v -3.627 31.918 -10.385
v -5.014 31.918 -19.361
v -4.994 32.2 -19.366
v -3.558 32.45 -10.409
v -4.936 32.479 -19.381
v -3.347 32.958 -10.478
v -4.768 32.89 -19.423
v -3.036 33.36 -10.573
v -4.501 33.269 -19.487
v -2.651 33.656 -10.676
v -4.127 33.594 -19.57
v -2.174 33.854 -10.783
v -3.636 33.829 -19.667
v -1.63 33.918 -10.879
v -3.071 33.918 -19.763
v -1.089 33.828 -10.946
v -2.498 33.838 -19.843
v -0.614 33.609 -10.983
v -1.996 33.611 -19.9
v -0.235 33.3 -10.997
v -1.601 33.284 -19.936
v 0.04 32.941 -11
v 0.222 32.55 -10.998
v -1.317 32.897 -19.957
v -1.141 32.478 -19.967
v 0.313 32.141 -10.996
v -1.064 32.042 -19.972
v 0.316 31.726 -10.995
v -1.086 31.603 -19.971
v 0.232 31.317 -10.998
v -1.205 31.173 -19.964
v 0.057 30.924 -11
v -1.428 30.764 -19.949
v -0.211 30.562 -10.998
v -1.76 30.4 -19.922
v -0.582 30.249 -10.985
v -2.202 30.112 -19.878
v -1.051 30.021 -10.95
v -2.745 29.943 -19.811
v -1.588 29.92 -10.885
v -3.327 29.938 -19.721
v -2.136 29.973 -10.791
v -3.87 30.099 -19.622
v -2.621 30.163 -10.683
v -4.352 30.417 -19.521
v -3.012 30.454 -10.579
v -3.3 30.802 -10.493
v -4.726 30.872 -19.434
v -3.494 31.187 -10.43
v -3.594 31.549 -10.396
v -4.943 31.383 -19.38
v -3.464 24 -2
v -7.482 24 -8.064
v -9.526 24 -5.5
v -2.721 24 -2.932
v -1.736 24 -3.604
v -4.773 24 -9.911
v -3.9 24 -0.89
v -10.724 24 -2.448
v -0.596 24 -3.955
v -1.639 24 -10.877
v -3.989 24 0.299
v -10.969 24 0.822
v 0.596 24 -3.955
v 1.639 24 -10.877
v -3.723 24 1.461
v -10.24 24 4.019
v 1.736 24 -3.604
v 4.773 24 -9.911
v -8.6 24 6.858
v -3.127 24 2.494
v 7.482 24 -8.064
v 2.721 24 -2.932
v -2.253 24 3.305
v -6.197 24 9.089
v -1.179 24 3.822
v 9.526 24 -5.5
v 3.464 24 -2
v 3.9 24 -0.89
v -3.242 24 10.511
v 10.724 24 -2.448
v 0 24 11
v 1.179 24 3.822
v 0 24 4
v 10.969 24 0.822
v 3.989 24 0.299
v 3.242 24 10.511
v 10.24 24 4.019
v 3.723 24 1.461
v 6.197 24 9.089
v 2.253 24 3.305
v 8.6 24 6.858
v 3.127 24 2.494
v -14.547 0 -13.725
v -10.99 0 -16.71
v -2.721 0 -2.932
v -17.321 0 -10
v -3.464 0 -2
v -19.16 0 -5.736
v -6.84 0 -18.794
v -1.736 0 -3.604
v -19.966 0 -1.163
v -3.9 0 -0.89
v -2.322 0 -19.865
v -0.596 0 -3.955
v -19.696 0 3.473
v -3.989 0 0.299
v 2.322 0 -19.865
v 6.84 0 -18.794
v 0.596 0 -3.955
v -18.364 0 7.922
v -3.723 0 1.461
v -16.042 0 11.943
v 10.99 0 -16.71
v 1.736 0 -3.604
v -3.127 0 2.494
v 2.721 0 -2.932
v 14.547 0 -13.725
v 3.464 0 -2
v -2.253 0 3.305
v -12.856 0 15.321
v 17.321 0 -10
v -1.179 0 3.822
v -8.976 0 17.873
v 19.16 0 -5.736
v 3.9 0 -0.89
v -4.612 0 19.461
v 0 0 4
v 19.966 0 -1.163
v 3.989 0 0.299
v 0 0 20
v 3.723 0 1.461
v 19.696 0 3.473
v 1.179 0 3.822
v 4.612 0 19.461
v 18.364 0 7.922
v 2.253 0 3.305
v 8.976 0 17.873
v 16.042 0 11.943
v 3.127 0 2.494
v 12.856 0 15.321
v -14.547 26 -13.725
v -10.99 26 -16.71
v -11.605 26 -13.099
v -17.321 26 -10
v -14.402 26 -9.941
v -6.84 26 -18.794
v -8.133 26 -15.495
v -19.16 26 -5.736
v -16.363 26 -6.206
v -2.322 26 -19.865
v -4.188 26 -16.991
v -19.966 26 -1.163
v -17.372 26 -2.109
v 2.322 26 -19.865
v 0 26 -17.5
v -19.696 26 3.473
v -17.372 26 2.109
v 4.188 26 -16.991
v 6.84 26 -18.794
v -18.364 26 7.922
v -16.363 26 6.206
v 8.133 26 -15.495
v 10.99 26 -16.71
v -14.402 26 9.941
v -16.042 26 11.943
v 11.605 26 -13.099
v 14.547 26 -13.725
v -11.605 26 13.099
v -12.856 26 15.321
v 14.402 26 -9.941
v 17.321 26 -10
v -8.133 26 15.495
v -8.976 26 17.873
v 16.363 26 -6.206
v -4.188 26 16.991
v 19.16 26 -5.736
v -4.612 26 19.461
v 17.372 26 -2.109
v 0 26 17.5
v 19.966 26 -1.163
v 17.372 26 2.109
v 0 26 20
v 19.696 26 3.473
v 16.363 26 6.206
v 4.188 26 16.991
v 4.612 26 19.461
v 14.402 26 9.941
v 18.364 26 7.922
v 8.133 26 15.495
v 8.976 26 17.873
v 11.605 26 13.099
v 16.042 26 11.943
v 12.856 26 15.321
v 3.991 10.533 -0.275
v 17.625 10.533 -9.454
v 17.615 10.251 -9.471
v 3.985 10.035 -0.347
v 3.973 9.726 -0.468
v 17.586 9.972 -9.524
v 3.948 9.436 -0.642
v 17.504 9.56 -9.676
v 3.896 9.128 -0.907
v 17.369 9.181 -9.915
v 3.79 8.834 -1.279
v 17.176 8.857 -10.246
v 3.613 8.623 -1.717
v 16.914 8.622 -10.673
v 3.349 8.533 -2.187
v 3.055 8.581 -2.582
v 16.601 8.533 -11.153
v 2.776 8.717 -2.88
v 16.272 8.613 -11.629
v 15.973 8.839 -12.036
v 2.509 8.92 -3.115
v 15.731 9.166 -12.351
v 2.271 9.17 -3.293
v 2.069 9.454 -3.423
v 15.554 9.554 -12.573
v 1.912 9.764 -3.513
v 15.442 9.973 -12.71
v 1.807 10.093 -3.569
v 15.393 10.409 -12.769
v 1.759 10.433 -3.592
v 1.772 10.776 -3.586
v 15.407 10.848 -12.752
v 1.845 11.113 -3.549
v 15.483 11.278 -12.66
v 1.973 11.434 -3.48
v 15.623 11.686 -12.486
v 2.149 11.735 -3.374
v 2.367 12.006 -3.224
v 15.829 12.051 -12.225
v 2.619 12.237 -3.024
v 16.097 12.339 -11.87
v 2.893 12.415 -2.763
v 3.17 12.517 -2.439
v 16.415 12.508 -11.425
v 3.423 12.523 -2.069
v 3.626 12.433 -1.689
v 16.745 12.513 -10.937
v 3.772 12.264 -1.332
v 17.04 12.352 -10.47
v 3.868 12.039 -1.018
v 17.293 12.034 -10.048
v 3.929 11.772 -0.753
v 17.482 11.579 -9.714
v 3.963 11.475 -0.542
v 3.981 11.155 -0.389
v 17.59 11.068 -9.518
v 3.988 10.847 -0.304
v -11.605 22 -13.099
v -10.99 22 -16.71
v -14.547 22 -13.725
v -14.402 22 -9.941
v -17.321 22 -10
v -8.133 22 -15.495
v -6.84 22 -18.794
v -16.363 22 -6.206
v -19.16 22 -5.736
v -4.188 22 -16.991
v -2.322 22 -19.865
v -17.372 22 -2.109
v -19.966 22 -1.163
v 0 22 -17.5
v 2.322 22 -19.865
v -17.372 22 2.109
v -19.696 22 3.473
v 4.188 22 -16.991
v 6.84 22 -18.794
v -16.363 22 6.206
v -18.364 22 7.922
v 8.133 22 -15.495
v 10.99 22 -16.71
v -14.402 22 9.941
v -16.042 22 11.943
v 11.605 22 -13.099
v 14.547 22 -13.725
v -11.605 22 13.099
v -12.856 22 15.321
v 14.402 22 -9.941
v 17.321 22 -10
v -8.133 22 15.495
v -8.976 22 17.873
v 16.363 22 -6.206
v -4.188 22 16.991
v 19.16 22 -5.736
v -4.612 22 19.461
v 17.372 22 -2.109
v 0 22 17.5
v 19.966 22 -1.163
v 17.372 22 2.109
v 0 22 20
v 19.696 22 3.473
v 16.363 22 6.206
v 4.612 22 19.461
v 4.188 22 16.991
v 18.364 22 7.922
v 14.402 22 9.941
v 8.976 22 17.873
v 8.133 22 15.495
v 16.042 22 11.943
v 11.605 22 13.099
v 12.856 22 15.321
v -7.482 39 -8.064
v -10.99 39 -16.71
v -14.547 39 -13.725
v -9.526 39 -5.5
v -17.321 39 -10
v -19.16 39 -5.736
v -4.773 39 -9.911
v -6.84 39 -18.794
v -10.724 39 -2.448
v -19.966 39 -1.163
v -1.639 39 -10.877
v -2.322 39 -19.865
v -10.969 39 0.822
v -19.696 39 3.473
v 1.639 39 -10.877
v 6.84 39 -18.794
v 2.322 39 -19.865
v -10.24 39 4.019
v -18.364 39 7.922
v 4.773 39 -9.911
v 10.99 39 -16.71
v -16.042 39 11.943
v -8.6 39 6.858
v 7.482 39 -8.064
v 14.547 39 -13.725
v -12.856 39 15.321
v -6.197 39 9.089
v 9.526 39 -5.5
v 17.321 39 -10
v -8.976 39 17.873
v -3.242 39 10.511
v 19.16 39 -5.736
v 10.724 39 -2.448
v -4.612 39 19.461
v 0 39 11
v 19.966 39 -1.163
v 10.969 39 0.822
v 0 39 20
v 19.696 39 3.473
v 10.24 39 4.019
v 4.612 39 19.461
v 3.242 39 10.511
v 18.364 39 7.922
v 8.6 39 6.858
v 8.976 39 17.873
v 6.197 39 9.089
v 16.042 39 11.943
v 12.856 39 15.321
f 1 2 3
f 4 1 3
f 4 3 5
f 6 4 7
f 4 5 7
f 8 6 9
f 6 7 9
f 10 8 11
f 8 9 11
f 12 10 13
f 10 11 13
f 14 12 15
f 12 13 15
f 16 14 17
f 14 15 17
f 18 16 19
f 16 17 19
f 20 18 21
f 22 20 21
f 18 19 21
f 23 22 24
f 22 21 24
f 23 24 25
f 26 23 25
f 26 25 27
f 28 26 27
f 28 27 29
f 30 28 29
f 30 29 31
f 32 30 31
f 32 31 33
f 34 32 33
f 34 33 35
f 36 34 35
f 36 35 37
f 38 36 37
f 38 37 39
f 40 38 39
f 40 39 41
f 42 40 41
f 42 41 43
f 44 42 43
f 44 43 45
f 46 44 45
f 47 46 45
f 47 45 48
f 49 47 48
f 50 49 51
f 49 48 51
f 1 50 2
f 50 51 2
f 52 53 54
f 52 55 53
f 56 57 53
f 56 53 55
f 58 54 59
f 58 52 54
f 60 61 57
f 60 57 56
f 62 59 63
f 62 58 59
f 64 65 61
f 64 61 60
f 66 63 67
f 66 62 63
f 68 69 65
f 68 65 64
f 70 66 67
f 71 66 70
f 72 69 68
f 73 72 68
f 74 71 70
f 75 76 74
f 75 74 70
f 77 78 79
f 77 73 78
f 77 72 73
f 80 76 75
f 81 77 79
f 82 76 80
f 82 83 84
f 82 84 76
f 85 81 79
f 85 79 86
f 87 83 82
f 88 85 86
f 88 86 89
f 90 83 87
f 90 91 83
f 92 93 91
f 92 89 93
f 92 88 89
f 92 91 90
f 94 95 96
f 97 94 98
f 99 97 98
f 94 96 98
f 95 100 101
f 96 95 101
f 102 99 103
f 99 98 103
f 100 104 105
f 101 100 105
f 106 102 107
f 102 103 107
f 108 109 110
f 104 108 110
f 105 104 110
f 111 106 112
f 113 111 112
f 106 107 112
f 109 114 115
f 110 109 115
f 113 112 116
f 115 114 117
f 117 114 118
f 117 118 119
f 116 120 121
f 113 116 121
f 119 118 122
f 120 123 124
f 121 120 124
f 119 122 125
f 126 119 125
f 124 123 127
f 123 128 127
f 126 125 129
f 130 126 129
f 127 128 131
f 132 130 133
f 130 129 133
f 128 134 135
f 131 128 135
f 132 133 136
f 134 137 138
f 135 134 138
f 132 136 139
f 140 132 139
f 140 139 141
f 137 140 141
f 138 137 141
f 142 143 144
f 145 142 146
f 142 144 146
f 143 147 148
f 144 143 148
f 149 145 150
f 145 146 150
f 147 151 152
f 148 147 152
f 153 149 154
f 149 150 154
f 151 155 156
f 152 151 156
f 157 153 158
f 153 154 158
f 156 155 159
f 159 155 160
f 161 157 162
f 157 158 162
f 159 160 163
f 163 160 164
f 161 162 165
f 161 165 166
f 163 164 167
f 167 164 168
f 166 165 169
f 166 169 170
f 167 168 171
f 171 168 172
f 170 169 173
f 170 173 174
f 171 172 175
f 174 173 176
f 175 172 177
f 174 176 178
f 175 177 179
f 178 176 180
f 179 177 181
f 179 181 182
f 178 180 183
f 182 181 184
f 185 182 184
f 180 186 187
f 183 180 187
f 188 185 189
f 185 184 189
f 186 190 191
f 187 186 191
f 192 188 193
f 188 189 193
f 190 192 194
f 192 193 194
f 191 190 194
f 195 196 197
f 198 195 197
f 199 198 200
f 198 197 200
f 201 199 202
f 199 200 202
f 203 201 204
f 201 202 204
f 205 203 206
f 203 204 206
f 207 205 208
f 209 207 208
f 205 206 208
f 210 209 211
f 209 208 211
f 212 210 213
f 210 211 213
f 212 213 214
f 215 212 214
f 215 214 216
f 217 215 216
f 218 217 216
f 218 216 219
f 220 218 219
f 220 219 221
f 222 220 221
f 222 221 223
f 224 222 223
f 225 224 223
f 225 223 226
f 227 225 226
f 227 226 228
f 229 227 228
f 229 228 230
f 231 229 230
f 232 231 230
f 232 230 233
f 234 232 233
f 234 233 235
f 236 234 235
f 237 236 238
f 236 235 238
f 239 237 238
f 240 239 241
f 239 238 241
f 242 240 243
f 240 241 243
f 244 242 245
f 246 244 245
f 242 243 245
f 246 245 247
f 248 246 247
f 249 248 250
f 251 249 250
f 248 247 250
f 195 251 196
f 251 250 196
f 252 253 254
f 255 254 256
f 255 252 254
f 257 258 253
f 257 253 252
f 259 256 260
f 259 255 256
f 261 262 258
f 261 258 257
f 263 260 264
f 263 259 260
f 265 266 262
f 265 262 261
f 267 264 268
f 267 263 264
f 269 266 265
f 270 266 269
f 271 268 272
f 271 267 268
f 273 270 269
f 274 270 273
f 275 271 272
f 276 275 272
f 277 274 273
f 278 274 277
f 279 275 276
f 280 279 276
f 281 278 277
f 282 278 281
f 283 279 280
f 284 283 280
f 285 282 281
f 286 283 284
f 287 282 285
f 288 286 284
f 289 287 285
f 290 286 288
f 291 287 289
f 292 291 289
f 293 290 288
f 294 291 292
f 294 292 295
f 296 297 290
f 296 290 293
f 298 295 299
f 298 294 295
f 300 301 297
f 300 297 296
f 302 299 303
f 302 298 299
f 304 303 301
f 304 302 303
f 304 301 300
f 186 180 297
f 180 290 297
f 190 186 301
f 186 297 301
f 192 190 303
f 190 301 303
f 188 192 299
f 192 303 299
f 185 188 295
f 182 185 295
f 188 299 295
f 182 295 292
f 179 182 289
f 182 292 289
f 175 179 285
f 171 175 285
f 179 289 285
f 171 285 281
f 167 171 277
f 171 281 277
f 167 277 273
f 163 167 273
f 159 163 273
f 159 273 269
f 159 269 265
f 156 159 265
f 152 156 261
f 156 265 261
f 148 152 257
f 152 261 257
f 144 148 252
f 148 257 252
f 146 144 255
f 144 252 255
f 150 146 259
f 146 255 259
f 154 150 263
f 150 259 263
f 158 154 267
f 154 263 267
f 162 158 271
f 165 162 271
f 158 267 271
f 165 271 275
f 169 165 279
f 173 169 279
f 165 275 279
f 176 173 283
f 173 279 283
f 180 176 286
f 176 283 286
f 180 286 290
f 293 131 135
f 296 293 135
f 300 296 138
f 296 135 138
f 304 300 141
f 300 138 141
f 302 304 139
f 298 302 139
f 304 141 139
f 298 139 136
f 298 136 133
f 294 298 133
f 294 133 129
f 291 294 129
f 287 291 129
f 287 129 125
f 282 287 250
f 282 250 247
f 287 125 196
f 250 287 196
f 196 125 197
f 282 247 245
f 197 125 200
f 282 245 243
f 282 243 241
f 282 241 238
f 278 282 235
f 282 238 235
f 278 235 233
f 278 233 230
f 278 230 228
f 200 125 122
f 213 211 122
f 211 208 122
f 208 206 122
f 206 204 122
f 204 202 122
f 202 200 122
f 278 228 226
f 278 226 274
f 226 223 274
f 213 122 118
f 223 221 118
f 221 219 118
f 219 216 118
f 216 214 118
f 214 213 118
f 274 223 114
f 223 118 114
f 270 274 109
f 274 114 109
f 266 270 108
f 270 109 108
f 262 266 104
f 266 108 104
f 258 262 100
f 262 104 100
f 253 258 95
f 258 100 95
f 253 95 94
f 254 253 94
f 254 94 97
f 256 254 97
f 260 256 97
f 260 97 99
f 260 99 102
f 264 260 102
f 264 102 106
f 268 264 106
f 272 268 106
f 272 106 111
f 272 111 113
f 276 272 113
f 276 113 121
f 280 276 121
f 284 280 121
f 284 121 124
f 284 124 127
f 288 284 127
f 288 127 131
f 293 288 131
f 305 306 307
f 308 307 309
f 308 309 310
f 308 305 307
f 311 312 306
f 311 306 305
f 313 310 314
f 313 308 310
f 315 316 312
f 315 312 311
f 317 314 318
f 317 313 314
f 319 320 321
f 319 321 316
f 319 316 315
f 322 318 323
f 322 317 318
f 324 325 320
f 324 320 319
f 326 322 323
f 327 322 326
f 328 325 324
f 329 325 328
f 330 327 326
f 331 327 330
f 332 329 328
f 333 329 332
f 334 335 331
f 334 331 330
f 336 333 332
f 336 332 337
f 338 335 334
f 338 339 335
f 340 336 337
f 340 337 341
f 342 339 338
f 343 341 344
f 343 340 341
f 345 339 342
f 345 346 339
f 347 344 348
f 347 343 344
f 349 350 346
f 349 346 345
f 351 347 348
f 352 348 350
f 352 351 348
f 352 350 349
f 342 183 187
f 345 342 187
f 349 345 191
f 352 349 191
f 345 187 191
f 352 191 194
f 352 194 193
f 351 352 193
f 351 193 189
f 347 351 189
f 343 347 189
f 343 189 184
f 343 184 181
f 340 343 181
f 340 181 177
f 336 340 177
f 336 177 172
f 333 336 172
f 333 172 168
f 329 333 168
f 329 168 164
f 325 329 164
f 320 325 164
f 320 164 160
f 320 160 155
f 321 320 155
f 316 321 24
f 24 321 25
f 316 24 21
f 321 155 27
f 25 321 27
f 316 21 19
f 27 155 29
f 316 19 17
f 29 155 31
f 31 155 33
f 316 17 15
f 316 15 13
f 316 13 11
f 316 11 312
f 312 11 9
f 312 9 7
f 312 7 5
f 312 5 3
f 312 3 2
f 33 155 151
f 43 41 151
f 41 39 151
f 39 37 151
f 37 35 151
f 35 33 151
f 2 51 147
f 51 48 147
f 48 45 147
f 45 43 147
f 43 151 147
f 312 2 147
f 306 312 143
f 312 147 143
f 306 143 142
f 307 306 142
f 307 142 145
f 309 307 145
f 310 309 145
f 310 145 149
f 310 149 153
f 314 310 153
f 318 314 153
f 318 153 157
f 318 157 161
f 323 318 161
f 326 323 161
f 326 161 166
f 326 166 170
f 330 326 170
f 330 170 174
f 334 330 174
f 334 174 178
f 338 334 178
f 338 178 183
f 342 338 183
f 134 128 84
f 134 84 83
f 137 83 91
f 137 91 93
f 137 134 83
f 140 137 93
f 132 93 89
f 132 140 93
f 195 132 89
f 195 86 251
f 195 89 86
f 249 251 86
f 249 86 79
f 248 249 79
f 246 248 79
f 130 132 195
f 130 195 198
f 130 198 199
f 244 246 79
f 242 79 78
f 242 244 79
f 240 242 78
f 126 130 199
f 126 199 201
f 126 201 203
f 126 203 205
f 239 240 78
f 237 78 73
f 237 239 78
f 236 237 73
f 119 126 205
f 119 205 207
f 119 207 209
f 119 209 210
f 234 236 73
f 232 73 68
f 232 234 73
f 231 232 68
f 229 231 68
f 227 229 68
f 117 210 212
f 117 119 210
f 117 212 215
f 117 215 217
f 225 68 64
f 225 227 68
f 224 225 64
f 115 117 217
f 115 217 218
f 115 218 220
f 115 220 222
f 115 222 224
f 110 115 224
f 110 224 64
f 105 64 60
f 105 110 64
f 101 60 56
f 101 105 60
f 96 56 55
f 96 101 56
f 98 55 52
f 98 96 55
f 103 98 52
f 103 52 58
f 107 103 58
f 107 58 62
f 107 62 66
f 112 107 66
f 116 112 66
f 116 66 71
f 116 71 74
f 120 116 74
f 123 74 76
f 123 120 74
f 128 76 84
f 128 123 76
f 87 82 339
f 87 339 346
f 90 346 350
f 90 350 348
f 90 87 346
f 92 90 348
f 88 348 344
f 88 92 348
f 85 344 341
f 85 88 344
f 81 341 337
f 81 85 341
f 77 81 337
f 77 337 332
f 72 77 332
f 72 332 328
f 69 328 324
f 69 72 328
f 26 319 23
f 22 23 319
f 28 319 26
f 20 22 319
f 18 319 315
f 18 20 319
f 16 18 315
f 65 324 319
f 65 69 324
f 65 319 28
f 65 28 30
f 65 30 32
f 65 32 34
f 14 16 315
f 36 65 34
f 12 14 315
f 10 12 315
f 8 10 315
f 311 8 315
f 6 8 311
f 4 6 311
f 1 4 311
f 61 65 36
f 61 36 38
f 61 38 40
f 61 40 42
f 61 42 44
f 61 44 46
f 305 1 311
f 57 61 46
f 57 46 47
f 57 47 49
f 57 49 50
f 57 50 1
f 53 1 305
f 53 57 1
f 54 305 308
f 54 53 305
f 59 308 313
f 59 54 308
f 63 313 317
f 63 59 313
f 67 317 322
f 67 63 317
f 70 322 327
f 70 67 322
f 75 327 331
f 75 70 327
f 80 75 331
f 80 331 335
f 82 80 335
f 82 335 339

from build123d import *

# Parameters (mm, degrees)
SKETCH1_R                     = 20
SKETCH1_R_2                   = 4
BOSS_EXTRUDE1_DEPTH           = 22
SKETCH2_R                     = 17.5
SKETCH2_R_2                   = 4
BOSS_EXTRUDE2_DEPTH           = 2
SKETCH3_R                     = 17.5
SKETCH3_R_2                   = 11
BOSS_EXTRUDE3_DEPTH           = 2
SKETCH4_R                     = 20
SKETCH4_R_2                   = 11
BOSS_EXTRUDE4_DEPTH           = 13
F_4_0_4_DIAMETER_HOLE1_REACH  = 57.864
F_4_0_4_DIAMETER_HOLE1_BORE_R = 2
F_4_0_4_DIAMETER_HOLE2_REACH  = 57.96
F_4_0_4_DIAMETER_HOLE2_BORE_R = 2


with BuildPart() as part:
    # Sketch1 → Boss-Extrude1 (new body)
    with BuildSketch(Plane(origin=(0, 0, 0), x_dir=(1, 0, 0), z_dir=(0, 1, 0))):
        with Locations(Location((0, 0, 0), (0, 0, 270))):
            Circle(SKETCH1_R)
        with Locations(Location((0, 0, 0), (0, 0, 270))):
            Circle(SKETCH1_R_2, mode=Mode.SUBTRACT)
    extrude(amount=BOSS_EXTRUDE1_DEPTH)

    # Sketch2 → Boss-Extrude2 (add)
    with BuildSketch(Plane(origin=(0, 22, 0), x_dir=(1, 0, 0), z_dir=(0, 1, 0))):
        with Locations(Location((0, 0, 0), (0, 0, 270))):
            Circle(SKETCH2_R)
        with Locations(Location((0, 0, 0), (0, 0, 270))):
            Circle(SKETCH2_R_2, mode=Mode.SUBTRACT)
    extrude(amount=BOSS_EXTRUDE2_DEPTH)

    # Sketch3 → Boss-Extrude3 (add)
    with BuildSketch(Plane(origin=(0, 24, 0), x_dir=(1, 0, 0), z_dir=(0, 1, 0))):
        with Locations(Location((0, 0, 0), (0, 0, 270))):
            Circle(SKETCH3_R)
        with Locations(Location((0, 0, 0), (0, 0, 270))):
            Circle(SKETCH3_R_2, mode=Mode.SUBTRACT)
    extrude(amount=BOSS_EXTRUDE3_DEPTH)

    # Sketch4 → Boss-Extrude4 (add)
    with BuildSketch(Plane(origin=(0, 26, 0), x_dir=(1, 0, 0), z_dir=(0, 1, 0))):
        with Locations(Location((0, 0, 0), (0, 0, 270))):
            Circle(SKETCH4_R)
        with Locations(Location((0, 0, 0), (0, 0, 270))):
            Circle(SKETCH4_R_2, mode=Mode.SUBTRACT)
    extrude(amount=BOSS_EXTRUDE4_DEPTH)

    # Ø4.0 (4) Diameter Hole1 bore (on position points) → Ø4.0 (4) Diameter Hole1 (cut, up to next)
    with BuildSketch(Plane(origin=(16.590996999, 10.532581899, -11.168653391), x_dir=(0.55843266957, 0, 0.829549849953), z_dir=(0.829549849953, 0, -0.55843266957)), mode=Mode.PRIVATE) as f_4_0_4_diameter_hole1_sk1:
        Circle(F_4_0_4_DIAMETER_HOLE1_BORE_R)
    f_4_0_4_diameter_hole1_tool1 = extrude(f_4_0_4_diameter_hole1_sk1.sketch, amount=-F_4_0_4_DIAMETER_HOLE1_REACH, mode=Mode.PRIVATE) & part.part
    add(f_4_0_4_diameter_hole1_tool1.solids().sort_by_distance((16.590997, 10.532582, -11.168653))[0], mode=Mode.SUBTRACT)

    # Ø4.0 (4) Diameter Hole2 bore (on position points) → Ø4.0 (4) Diameter Hole2 (cut, up to next)
    with BuildSketch(Plane(origin=(-3.052461352, 31.918352454, -19.765689457), x_dir=(-0.98828447283, 0, 0.152623067601), z_dir=(-0.152623067601, 0, -0.98828447283)), mode=Mode.PRIVATE) as f_4_0_4_diameter_hole2_sk1:
        Circle(F_4_0_4_DIAMETER_HOLE2_BORE_R)
    f_4_0_4_diameter_hole2_tool1 = extrude(f_4_0_4_diameter_hole2_sk1.sketch, amount=-F_4_0_4_DIAMETER_HOLE2_REACH, mode=Mode.PRIVATE) & part.part
    add(f_4_0_4_diameter_hole2_tool1.solids().sort_by_distance((-3.052461, 31.918352, -19.765689))[0], mode=Mode.SUBTRACT)


solid = part.part
